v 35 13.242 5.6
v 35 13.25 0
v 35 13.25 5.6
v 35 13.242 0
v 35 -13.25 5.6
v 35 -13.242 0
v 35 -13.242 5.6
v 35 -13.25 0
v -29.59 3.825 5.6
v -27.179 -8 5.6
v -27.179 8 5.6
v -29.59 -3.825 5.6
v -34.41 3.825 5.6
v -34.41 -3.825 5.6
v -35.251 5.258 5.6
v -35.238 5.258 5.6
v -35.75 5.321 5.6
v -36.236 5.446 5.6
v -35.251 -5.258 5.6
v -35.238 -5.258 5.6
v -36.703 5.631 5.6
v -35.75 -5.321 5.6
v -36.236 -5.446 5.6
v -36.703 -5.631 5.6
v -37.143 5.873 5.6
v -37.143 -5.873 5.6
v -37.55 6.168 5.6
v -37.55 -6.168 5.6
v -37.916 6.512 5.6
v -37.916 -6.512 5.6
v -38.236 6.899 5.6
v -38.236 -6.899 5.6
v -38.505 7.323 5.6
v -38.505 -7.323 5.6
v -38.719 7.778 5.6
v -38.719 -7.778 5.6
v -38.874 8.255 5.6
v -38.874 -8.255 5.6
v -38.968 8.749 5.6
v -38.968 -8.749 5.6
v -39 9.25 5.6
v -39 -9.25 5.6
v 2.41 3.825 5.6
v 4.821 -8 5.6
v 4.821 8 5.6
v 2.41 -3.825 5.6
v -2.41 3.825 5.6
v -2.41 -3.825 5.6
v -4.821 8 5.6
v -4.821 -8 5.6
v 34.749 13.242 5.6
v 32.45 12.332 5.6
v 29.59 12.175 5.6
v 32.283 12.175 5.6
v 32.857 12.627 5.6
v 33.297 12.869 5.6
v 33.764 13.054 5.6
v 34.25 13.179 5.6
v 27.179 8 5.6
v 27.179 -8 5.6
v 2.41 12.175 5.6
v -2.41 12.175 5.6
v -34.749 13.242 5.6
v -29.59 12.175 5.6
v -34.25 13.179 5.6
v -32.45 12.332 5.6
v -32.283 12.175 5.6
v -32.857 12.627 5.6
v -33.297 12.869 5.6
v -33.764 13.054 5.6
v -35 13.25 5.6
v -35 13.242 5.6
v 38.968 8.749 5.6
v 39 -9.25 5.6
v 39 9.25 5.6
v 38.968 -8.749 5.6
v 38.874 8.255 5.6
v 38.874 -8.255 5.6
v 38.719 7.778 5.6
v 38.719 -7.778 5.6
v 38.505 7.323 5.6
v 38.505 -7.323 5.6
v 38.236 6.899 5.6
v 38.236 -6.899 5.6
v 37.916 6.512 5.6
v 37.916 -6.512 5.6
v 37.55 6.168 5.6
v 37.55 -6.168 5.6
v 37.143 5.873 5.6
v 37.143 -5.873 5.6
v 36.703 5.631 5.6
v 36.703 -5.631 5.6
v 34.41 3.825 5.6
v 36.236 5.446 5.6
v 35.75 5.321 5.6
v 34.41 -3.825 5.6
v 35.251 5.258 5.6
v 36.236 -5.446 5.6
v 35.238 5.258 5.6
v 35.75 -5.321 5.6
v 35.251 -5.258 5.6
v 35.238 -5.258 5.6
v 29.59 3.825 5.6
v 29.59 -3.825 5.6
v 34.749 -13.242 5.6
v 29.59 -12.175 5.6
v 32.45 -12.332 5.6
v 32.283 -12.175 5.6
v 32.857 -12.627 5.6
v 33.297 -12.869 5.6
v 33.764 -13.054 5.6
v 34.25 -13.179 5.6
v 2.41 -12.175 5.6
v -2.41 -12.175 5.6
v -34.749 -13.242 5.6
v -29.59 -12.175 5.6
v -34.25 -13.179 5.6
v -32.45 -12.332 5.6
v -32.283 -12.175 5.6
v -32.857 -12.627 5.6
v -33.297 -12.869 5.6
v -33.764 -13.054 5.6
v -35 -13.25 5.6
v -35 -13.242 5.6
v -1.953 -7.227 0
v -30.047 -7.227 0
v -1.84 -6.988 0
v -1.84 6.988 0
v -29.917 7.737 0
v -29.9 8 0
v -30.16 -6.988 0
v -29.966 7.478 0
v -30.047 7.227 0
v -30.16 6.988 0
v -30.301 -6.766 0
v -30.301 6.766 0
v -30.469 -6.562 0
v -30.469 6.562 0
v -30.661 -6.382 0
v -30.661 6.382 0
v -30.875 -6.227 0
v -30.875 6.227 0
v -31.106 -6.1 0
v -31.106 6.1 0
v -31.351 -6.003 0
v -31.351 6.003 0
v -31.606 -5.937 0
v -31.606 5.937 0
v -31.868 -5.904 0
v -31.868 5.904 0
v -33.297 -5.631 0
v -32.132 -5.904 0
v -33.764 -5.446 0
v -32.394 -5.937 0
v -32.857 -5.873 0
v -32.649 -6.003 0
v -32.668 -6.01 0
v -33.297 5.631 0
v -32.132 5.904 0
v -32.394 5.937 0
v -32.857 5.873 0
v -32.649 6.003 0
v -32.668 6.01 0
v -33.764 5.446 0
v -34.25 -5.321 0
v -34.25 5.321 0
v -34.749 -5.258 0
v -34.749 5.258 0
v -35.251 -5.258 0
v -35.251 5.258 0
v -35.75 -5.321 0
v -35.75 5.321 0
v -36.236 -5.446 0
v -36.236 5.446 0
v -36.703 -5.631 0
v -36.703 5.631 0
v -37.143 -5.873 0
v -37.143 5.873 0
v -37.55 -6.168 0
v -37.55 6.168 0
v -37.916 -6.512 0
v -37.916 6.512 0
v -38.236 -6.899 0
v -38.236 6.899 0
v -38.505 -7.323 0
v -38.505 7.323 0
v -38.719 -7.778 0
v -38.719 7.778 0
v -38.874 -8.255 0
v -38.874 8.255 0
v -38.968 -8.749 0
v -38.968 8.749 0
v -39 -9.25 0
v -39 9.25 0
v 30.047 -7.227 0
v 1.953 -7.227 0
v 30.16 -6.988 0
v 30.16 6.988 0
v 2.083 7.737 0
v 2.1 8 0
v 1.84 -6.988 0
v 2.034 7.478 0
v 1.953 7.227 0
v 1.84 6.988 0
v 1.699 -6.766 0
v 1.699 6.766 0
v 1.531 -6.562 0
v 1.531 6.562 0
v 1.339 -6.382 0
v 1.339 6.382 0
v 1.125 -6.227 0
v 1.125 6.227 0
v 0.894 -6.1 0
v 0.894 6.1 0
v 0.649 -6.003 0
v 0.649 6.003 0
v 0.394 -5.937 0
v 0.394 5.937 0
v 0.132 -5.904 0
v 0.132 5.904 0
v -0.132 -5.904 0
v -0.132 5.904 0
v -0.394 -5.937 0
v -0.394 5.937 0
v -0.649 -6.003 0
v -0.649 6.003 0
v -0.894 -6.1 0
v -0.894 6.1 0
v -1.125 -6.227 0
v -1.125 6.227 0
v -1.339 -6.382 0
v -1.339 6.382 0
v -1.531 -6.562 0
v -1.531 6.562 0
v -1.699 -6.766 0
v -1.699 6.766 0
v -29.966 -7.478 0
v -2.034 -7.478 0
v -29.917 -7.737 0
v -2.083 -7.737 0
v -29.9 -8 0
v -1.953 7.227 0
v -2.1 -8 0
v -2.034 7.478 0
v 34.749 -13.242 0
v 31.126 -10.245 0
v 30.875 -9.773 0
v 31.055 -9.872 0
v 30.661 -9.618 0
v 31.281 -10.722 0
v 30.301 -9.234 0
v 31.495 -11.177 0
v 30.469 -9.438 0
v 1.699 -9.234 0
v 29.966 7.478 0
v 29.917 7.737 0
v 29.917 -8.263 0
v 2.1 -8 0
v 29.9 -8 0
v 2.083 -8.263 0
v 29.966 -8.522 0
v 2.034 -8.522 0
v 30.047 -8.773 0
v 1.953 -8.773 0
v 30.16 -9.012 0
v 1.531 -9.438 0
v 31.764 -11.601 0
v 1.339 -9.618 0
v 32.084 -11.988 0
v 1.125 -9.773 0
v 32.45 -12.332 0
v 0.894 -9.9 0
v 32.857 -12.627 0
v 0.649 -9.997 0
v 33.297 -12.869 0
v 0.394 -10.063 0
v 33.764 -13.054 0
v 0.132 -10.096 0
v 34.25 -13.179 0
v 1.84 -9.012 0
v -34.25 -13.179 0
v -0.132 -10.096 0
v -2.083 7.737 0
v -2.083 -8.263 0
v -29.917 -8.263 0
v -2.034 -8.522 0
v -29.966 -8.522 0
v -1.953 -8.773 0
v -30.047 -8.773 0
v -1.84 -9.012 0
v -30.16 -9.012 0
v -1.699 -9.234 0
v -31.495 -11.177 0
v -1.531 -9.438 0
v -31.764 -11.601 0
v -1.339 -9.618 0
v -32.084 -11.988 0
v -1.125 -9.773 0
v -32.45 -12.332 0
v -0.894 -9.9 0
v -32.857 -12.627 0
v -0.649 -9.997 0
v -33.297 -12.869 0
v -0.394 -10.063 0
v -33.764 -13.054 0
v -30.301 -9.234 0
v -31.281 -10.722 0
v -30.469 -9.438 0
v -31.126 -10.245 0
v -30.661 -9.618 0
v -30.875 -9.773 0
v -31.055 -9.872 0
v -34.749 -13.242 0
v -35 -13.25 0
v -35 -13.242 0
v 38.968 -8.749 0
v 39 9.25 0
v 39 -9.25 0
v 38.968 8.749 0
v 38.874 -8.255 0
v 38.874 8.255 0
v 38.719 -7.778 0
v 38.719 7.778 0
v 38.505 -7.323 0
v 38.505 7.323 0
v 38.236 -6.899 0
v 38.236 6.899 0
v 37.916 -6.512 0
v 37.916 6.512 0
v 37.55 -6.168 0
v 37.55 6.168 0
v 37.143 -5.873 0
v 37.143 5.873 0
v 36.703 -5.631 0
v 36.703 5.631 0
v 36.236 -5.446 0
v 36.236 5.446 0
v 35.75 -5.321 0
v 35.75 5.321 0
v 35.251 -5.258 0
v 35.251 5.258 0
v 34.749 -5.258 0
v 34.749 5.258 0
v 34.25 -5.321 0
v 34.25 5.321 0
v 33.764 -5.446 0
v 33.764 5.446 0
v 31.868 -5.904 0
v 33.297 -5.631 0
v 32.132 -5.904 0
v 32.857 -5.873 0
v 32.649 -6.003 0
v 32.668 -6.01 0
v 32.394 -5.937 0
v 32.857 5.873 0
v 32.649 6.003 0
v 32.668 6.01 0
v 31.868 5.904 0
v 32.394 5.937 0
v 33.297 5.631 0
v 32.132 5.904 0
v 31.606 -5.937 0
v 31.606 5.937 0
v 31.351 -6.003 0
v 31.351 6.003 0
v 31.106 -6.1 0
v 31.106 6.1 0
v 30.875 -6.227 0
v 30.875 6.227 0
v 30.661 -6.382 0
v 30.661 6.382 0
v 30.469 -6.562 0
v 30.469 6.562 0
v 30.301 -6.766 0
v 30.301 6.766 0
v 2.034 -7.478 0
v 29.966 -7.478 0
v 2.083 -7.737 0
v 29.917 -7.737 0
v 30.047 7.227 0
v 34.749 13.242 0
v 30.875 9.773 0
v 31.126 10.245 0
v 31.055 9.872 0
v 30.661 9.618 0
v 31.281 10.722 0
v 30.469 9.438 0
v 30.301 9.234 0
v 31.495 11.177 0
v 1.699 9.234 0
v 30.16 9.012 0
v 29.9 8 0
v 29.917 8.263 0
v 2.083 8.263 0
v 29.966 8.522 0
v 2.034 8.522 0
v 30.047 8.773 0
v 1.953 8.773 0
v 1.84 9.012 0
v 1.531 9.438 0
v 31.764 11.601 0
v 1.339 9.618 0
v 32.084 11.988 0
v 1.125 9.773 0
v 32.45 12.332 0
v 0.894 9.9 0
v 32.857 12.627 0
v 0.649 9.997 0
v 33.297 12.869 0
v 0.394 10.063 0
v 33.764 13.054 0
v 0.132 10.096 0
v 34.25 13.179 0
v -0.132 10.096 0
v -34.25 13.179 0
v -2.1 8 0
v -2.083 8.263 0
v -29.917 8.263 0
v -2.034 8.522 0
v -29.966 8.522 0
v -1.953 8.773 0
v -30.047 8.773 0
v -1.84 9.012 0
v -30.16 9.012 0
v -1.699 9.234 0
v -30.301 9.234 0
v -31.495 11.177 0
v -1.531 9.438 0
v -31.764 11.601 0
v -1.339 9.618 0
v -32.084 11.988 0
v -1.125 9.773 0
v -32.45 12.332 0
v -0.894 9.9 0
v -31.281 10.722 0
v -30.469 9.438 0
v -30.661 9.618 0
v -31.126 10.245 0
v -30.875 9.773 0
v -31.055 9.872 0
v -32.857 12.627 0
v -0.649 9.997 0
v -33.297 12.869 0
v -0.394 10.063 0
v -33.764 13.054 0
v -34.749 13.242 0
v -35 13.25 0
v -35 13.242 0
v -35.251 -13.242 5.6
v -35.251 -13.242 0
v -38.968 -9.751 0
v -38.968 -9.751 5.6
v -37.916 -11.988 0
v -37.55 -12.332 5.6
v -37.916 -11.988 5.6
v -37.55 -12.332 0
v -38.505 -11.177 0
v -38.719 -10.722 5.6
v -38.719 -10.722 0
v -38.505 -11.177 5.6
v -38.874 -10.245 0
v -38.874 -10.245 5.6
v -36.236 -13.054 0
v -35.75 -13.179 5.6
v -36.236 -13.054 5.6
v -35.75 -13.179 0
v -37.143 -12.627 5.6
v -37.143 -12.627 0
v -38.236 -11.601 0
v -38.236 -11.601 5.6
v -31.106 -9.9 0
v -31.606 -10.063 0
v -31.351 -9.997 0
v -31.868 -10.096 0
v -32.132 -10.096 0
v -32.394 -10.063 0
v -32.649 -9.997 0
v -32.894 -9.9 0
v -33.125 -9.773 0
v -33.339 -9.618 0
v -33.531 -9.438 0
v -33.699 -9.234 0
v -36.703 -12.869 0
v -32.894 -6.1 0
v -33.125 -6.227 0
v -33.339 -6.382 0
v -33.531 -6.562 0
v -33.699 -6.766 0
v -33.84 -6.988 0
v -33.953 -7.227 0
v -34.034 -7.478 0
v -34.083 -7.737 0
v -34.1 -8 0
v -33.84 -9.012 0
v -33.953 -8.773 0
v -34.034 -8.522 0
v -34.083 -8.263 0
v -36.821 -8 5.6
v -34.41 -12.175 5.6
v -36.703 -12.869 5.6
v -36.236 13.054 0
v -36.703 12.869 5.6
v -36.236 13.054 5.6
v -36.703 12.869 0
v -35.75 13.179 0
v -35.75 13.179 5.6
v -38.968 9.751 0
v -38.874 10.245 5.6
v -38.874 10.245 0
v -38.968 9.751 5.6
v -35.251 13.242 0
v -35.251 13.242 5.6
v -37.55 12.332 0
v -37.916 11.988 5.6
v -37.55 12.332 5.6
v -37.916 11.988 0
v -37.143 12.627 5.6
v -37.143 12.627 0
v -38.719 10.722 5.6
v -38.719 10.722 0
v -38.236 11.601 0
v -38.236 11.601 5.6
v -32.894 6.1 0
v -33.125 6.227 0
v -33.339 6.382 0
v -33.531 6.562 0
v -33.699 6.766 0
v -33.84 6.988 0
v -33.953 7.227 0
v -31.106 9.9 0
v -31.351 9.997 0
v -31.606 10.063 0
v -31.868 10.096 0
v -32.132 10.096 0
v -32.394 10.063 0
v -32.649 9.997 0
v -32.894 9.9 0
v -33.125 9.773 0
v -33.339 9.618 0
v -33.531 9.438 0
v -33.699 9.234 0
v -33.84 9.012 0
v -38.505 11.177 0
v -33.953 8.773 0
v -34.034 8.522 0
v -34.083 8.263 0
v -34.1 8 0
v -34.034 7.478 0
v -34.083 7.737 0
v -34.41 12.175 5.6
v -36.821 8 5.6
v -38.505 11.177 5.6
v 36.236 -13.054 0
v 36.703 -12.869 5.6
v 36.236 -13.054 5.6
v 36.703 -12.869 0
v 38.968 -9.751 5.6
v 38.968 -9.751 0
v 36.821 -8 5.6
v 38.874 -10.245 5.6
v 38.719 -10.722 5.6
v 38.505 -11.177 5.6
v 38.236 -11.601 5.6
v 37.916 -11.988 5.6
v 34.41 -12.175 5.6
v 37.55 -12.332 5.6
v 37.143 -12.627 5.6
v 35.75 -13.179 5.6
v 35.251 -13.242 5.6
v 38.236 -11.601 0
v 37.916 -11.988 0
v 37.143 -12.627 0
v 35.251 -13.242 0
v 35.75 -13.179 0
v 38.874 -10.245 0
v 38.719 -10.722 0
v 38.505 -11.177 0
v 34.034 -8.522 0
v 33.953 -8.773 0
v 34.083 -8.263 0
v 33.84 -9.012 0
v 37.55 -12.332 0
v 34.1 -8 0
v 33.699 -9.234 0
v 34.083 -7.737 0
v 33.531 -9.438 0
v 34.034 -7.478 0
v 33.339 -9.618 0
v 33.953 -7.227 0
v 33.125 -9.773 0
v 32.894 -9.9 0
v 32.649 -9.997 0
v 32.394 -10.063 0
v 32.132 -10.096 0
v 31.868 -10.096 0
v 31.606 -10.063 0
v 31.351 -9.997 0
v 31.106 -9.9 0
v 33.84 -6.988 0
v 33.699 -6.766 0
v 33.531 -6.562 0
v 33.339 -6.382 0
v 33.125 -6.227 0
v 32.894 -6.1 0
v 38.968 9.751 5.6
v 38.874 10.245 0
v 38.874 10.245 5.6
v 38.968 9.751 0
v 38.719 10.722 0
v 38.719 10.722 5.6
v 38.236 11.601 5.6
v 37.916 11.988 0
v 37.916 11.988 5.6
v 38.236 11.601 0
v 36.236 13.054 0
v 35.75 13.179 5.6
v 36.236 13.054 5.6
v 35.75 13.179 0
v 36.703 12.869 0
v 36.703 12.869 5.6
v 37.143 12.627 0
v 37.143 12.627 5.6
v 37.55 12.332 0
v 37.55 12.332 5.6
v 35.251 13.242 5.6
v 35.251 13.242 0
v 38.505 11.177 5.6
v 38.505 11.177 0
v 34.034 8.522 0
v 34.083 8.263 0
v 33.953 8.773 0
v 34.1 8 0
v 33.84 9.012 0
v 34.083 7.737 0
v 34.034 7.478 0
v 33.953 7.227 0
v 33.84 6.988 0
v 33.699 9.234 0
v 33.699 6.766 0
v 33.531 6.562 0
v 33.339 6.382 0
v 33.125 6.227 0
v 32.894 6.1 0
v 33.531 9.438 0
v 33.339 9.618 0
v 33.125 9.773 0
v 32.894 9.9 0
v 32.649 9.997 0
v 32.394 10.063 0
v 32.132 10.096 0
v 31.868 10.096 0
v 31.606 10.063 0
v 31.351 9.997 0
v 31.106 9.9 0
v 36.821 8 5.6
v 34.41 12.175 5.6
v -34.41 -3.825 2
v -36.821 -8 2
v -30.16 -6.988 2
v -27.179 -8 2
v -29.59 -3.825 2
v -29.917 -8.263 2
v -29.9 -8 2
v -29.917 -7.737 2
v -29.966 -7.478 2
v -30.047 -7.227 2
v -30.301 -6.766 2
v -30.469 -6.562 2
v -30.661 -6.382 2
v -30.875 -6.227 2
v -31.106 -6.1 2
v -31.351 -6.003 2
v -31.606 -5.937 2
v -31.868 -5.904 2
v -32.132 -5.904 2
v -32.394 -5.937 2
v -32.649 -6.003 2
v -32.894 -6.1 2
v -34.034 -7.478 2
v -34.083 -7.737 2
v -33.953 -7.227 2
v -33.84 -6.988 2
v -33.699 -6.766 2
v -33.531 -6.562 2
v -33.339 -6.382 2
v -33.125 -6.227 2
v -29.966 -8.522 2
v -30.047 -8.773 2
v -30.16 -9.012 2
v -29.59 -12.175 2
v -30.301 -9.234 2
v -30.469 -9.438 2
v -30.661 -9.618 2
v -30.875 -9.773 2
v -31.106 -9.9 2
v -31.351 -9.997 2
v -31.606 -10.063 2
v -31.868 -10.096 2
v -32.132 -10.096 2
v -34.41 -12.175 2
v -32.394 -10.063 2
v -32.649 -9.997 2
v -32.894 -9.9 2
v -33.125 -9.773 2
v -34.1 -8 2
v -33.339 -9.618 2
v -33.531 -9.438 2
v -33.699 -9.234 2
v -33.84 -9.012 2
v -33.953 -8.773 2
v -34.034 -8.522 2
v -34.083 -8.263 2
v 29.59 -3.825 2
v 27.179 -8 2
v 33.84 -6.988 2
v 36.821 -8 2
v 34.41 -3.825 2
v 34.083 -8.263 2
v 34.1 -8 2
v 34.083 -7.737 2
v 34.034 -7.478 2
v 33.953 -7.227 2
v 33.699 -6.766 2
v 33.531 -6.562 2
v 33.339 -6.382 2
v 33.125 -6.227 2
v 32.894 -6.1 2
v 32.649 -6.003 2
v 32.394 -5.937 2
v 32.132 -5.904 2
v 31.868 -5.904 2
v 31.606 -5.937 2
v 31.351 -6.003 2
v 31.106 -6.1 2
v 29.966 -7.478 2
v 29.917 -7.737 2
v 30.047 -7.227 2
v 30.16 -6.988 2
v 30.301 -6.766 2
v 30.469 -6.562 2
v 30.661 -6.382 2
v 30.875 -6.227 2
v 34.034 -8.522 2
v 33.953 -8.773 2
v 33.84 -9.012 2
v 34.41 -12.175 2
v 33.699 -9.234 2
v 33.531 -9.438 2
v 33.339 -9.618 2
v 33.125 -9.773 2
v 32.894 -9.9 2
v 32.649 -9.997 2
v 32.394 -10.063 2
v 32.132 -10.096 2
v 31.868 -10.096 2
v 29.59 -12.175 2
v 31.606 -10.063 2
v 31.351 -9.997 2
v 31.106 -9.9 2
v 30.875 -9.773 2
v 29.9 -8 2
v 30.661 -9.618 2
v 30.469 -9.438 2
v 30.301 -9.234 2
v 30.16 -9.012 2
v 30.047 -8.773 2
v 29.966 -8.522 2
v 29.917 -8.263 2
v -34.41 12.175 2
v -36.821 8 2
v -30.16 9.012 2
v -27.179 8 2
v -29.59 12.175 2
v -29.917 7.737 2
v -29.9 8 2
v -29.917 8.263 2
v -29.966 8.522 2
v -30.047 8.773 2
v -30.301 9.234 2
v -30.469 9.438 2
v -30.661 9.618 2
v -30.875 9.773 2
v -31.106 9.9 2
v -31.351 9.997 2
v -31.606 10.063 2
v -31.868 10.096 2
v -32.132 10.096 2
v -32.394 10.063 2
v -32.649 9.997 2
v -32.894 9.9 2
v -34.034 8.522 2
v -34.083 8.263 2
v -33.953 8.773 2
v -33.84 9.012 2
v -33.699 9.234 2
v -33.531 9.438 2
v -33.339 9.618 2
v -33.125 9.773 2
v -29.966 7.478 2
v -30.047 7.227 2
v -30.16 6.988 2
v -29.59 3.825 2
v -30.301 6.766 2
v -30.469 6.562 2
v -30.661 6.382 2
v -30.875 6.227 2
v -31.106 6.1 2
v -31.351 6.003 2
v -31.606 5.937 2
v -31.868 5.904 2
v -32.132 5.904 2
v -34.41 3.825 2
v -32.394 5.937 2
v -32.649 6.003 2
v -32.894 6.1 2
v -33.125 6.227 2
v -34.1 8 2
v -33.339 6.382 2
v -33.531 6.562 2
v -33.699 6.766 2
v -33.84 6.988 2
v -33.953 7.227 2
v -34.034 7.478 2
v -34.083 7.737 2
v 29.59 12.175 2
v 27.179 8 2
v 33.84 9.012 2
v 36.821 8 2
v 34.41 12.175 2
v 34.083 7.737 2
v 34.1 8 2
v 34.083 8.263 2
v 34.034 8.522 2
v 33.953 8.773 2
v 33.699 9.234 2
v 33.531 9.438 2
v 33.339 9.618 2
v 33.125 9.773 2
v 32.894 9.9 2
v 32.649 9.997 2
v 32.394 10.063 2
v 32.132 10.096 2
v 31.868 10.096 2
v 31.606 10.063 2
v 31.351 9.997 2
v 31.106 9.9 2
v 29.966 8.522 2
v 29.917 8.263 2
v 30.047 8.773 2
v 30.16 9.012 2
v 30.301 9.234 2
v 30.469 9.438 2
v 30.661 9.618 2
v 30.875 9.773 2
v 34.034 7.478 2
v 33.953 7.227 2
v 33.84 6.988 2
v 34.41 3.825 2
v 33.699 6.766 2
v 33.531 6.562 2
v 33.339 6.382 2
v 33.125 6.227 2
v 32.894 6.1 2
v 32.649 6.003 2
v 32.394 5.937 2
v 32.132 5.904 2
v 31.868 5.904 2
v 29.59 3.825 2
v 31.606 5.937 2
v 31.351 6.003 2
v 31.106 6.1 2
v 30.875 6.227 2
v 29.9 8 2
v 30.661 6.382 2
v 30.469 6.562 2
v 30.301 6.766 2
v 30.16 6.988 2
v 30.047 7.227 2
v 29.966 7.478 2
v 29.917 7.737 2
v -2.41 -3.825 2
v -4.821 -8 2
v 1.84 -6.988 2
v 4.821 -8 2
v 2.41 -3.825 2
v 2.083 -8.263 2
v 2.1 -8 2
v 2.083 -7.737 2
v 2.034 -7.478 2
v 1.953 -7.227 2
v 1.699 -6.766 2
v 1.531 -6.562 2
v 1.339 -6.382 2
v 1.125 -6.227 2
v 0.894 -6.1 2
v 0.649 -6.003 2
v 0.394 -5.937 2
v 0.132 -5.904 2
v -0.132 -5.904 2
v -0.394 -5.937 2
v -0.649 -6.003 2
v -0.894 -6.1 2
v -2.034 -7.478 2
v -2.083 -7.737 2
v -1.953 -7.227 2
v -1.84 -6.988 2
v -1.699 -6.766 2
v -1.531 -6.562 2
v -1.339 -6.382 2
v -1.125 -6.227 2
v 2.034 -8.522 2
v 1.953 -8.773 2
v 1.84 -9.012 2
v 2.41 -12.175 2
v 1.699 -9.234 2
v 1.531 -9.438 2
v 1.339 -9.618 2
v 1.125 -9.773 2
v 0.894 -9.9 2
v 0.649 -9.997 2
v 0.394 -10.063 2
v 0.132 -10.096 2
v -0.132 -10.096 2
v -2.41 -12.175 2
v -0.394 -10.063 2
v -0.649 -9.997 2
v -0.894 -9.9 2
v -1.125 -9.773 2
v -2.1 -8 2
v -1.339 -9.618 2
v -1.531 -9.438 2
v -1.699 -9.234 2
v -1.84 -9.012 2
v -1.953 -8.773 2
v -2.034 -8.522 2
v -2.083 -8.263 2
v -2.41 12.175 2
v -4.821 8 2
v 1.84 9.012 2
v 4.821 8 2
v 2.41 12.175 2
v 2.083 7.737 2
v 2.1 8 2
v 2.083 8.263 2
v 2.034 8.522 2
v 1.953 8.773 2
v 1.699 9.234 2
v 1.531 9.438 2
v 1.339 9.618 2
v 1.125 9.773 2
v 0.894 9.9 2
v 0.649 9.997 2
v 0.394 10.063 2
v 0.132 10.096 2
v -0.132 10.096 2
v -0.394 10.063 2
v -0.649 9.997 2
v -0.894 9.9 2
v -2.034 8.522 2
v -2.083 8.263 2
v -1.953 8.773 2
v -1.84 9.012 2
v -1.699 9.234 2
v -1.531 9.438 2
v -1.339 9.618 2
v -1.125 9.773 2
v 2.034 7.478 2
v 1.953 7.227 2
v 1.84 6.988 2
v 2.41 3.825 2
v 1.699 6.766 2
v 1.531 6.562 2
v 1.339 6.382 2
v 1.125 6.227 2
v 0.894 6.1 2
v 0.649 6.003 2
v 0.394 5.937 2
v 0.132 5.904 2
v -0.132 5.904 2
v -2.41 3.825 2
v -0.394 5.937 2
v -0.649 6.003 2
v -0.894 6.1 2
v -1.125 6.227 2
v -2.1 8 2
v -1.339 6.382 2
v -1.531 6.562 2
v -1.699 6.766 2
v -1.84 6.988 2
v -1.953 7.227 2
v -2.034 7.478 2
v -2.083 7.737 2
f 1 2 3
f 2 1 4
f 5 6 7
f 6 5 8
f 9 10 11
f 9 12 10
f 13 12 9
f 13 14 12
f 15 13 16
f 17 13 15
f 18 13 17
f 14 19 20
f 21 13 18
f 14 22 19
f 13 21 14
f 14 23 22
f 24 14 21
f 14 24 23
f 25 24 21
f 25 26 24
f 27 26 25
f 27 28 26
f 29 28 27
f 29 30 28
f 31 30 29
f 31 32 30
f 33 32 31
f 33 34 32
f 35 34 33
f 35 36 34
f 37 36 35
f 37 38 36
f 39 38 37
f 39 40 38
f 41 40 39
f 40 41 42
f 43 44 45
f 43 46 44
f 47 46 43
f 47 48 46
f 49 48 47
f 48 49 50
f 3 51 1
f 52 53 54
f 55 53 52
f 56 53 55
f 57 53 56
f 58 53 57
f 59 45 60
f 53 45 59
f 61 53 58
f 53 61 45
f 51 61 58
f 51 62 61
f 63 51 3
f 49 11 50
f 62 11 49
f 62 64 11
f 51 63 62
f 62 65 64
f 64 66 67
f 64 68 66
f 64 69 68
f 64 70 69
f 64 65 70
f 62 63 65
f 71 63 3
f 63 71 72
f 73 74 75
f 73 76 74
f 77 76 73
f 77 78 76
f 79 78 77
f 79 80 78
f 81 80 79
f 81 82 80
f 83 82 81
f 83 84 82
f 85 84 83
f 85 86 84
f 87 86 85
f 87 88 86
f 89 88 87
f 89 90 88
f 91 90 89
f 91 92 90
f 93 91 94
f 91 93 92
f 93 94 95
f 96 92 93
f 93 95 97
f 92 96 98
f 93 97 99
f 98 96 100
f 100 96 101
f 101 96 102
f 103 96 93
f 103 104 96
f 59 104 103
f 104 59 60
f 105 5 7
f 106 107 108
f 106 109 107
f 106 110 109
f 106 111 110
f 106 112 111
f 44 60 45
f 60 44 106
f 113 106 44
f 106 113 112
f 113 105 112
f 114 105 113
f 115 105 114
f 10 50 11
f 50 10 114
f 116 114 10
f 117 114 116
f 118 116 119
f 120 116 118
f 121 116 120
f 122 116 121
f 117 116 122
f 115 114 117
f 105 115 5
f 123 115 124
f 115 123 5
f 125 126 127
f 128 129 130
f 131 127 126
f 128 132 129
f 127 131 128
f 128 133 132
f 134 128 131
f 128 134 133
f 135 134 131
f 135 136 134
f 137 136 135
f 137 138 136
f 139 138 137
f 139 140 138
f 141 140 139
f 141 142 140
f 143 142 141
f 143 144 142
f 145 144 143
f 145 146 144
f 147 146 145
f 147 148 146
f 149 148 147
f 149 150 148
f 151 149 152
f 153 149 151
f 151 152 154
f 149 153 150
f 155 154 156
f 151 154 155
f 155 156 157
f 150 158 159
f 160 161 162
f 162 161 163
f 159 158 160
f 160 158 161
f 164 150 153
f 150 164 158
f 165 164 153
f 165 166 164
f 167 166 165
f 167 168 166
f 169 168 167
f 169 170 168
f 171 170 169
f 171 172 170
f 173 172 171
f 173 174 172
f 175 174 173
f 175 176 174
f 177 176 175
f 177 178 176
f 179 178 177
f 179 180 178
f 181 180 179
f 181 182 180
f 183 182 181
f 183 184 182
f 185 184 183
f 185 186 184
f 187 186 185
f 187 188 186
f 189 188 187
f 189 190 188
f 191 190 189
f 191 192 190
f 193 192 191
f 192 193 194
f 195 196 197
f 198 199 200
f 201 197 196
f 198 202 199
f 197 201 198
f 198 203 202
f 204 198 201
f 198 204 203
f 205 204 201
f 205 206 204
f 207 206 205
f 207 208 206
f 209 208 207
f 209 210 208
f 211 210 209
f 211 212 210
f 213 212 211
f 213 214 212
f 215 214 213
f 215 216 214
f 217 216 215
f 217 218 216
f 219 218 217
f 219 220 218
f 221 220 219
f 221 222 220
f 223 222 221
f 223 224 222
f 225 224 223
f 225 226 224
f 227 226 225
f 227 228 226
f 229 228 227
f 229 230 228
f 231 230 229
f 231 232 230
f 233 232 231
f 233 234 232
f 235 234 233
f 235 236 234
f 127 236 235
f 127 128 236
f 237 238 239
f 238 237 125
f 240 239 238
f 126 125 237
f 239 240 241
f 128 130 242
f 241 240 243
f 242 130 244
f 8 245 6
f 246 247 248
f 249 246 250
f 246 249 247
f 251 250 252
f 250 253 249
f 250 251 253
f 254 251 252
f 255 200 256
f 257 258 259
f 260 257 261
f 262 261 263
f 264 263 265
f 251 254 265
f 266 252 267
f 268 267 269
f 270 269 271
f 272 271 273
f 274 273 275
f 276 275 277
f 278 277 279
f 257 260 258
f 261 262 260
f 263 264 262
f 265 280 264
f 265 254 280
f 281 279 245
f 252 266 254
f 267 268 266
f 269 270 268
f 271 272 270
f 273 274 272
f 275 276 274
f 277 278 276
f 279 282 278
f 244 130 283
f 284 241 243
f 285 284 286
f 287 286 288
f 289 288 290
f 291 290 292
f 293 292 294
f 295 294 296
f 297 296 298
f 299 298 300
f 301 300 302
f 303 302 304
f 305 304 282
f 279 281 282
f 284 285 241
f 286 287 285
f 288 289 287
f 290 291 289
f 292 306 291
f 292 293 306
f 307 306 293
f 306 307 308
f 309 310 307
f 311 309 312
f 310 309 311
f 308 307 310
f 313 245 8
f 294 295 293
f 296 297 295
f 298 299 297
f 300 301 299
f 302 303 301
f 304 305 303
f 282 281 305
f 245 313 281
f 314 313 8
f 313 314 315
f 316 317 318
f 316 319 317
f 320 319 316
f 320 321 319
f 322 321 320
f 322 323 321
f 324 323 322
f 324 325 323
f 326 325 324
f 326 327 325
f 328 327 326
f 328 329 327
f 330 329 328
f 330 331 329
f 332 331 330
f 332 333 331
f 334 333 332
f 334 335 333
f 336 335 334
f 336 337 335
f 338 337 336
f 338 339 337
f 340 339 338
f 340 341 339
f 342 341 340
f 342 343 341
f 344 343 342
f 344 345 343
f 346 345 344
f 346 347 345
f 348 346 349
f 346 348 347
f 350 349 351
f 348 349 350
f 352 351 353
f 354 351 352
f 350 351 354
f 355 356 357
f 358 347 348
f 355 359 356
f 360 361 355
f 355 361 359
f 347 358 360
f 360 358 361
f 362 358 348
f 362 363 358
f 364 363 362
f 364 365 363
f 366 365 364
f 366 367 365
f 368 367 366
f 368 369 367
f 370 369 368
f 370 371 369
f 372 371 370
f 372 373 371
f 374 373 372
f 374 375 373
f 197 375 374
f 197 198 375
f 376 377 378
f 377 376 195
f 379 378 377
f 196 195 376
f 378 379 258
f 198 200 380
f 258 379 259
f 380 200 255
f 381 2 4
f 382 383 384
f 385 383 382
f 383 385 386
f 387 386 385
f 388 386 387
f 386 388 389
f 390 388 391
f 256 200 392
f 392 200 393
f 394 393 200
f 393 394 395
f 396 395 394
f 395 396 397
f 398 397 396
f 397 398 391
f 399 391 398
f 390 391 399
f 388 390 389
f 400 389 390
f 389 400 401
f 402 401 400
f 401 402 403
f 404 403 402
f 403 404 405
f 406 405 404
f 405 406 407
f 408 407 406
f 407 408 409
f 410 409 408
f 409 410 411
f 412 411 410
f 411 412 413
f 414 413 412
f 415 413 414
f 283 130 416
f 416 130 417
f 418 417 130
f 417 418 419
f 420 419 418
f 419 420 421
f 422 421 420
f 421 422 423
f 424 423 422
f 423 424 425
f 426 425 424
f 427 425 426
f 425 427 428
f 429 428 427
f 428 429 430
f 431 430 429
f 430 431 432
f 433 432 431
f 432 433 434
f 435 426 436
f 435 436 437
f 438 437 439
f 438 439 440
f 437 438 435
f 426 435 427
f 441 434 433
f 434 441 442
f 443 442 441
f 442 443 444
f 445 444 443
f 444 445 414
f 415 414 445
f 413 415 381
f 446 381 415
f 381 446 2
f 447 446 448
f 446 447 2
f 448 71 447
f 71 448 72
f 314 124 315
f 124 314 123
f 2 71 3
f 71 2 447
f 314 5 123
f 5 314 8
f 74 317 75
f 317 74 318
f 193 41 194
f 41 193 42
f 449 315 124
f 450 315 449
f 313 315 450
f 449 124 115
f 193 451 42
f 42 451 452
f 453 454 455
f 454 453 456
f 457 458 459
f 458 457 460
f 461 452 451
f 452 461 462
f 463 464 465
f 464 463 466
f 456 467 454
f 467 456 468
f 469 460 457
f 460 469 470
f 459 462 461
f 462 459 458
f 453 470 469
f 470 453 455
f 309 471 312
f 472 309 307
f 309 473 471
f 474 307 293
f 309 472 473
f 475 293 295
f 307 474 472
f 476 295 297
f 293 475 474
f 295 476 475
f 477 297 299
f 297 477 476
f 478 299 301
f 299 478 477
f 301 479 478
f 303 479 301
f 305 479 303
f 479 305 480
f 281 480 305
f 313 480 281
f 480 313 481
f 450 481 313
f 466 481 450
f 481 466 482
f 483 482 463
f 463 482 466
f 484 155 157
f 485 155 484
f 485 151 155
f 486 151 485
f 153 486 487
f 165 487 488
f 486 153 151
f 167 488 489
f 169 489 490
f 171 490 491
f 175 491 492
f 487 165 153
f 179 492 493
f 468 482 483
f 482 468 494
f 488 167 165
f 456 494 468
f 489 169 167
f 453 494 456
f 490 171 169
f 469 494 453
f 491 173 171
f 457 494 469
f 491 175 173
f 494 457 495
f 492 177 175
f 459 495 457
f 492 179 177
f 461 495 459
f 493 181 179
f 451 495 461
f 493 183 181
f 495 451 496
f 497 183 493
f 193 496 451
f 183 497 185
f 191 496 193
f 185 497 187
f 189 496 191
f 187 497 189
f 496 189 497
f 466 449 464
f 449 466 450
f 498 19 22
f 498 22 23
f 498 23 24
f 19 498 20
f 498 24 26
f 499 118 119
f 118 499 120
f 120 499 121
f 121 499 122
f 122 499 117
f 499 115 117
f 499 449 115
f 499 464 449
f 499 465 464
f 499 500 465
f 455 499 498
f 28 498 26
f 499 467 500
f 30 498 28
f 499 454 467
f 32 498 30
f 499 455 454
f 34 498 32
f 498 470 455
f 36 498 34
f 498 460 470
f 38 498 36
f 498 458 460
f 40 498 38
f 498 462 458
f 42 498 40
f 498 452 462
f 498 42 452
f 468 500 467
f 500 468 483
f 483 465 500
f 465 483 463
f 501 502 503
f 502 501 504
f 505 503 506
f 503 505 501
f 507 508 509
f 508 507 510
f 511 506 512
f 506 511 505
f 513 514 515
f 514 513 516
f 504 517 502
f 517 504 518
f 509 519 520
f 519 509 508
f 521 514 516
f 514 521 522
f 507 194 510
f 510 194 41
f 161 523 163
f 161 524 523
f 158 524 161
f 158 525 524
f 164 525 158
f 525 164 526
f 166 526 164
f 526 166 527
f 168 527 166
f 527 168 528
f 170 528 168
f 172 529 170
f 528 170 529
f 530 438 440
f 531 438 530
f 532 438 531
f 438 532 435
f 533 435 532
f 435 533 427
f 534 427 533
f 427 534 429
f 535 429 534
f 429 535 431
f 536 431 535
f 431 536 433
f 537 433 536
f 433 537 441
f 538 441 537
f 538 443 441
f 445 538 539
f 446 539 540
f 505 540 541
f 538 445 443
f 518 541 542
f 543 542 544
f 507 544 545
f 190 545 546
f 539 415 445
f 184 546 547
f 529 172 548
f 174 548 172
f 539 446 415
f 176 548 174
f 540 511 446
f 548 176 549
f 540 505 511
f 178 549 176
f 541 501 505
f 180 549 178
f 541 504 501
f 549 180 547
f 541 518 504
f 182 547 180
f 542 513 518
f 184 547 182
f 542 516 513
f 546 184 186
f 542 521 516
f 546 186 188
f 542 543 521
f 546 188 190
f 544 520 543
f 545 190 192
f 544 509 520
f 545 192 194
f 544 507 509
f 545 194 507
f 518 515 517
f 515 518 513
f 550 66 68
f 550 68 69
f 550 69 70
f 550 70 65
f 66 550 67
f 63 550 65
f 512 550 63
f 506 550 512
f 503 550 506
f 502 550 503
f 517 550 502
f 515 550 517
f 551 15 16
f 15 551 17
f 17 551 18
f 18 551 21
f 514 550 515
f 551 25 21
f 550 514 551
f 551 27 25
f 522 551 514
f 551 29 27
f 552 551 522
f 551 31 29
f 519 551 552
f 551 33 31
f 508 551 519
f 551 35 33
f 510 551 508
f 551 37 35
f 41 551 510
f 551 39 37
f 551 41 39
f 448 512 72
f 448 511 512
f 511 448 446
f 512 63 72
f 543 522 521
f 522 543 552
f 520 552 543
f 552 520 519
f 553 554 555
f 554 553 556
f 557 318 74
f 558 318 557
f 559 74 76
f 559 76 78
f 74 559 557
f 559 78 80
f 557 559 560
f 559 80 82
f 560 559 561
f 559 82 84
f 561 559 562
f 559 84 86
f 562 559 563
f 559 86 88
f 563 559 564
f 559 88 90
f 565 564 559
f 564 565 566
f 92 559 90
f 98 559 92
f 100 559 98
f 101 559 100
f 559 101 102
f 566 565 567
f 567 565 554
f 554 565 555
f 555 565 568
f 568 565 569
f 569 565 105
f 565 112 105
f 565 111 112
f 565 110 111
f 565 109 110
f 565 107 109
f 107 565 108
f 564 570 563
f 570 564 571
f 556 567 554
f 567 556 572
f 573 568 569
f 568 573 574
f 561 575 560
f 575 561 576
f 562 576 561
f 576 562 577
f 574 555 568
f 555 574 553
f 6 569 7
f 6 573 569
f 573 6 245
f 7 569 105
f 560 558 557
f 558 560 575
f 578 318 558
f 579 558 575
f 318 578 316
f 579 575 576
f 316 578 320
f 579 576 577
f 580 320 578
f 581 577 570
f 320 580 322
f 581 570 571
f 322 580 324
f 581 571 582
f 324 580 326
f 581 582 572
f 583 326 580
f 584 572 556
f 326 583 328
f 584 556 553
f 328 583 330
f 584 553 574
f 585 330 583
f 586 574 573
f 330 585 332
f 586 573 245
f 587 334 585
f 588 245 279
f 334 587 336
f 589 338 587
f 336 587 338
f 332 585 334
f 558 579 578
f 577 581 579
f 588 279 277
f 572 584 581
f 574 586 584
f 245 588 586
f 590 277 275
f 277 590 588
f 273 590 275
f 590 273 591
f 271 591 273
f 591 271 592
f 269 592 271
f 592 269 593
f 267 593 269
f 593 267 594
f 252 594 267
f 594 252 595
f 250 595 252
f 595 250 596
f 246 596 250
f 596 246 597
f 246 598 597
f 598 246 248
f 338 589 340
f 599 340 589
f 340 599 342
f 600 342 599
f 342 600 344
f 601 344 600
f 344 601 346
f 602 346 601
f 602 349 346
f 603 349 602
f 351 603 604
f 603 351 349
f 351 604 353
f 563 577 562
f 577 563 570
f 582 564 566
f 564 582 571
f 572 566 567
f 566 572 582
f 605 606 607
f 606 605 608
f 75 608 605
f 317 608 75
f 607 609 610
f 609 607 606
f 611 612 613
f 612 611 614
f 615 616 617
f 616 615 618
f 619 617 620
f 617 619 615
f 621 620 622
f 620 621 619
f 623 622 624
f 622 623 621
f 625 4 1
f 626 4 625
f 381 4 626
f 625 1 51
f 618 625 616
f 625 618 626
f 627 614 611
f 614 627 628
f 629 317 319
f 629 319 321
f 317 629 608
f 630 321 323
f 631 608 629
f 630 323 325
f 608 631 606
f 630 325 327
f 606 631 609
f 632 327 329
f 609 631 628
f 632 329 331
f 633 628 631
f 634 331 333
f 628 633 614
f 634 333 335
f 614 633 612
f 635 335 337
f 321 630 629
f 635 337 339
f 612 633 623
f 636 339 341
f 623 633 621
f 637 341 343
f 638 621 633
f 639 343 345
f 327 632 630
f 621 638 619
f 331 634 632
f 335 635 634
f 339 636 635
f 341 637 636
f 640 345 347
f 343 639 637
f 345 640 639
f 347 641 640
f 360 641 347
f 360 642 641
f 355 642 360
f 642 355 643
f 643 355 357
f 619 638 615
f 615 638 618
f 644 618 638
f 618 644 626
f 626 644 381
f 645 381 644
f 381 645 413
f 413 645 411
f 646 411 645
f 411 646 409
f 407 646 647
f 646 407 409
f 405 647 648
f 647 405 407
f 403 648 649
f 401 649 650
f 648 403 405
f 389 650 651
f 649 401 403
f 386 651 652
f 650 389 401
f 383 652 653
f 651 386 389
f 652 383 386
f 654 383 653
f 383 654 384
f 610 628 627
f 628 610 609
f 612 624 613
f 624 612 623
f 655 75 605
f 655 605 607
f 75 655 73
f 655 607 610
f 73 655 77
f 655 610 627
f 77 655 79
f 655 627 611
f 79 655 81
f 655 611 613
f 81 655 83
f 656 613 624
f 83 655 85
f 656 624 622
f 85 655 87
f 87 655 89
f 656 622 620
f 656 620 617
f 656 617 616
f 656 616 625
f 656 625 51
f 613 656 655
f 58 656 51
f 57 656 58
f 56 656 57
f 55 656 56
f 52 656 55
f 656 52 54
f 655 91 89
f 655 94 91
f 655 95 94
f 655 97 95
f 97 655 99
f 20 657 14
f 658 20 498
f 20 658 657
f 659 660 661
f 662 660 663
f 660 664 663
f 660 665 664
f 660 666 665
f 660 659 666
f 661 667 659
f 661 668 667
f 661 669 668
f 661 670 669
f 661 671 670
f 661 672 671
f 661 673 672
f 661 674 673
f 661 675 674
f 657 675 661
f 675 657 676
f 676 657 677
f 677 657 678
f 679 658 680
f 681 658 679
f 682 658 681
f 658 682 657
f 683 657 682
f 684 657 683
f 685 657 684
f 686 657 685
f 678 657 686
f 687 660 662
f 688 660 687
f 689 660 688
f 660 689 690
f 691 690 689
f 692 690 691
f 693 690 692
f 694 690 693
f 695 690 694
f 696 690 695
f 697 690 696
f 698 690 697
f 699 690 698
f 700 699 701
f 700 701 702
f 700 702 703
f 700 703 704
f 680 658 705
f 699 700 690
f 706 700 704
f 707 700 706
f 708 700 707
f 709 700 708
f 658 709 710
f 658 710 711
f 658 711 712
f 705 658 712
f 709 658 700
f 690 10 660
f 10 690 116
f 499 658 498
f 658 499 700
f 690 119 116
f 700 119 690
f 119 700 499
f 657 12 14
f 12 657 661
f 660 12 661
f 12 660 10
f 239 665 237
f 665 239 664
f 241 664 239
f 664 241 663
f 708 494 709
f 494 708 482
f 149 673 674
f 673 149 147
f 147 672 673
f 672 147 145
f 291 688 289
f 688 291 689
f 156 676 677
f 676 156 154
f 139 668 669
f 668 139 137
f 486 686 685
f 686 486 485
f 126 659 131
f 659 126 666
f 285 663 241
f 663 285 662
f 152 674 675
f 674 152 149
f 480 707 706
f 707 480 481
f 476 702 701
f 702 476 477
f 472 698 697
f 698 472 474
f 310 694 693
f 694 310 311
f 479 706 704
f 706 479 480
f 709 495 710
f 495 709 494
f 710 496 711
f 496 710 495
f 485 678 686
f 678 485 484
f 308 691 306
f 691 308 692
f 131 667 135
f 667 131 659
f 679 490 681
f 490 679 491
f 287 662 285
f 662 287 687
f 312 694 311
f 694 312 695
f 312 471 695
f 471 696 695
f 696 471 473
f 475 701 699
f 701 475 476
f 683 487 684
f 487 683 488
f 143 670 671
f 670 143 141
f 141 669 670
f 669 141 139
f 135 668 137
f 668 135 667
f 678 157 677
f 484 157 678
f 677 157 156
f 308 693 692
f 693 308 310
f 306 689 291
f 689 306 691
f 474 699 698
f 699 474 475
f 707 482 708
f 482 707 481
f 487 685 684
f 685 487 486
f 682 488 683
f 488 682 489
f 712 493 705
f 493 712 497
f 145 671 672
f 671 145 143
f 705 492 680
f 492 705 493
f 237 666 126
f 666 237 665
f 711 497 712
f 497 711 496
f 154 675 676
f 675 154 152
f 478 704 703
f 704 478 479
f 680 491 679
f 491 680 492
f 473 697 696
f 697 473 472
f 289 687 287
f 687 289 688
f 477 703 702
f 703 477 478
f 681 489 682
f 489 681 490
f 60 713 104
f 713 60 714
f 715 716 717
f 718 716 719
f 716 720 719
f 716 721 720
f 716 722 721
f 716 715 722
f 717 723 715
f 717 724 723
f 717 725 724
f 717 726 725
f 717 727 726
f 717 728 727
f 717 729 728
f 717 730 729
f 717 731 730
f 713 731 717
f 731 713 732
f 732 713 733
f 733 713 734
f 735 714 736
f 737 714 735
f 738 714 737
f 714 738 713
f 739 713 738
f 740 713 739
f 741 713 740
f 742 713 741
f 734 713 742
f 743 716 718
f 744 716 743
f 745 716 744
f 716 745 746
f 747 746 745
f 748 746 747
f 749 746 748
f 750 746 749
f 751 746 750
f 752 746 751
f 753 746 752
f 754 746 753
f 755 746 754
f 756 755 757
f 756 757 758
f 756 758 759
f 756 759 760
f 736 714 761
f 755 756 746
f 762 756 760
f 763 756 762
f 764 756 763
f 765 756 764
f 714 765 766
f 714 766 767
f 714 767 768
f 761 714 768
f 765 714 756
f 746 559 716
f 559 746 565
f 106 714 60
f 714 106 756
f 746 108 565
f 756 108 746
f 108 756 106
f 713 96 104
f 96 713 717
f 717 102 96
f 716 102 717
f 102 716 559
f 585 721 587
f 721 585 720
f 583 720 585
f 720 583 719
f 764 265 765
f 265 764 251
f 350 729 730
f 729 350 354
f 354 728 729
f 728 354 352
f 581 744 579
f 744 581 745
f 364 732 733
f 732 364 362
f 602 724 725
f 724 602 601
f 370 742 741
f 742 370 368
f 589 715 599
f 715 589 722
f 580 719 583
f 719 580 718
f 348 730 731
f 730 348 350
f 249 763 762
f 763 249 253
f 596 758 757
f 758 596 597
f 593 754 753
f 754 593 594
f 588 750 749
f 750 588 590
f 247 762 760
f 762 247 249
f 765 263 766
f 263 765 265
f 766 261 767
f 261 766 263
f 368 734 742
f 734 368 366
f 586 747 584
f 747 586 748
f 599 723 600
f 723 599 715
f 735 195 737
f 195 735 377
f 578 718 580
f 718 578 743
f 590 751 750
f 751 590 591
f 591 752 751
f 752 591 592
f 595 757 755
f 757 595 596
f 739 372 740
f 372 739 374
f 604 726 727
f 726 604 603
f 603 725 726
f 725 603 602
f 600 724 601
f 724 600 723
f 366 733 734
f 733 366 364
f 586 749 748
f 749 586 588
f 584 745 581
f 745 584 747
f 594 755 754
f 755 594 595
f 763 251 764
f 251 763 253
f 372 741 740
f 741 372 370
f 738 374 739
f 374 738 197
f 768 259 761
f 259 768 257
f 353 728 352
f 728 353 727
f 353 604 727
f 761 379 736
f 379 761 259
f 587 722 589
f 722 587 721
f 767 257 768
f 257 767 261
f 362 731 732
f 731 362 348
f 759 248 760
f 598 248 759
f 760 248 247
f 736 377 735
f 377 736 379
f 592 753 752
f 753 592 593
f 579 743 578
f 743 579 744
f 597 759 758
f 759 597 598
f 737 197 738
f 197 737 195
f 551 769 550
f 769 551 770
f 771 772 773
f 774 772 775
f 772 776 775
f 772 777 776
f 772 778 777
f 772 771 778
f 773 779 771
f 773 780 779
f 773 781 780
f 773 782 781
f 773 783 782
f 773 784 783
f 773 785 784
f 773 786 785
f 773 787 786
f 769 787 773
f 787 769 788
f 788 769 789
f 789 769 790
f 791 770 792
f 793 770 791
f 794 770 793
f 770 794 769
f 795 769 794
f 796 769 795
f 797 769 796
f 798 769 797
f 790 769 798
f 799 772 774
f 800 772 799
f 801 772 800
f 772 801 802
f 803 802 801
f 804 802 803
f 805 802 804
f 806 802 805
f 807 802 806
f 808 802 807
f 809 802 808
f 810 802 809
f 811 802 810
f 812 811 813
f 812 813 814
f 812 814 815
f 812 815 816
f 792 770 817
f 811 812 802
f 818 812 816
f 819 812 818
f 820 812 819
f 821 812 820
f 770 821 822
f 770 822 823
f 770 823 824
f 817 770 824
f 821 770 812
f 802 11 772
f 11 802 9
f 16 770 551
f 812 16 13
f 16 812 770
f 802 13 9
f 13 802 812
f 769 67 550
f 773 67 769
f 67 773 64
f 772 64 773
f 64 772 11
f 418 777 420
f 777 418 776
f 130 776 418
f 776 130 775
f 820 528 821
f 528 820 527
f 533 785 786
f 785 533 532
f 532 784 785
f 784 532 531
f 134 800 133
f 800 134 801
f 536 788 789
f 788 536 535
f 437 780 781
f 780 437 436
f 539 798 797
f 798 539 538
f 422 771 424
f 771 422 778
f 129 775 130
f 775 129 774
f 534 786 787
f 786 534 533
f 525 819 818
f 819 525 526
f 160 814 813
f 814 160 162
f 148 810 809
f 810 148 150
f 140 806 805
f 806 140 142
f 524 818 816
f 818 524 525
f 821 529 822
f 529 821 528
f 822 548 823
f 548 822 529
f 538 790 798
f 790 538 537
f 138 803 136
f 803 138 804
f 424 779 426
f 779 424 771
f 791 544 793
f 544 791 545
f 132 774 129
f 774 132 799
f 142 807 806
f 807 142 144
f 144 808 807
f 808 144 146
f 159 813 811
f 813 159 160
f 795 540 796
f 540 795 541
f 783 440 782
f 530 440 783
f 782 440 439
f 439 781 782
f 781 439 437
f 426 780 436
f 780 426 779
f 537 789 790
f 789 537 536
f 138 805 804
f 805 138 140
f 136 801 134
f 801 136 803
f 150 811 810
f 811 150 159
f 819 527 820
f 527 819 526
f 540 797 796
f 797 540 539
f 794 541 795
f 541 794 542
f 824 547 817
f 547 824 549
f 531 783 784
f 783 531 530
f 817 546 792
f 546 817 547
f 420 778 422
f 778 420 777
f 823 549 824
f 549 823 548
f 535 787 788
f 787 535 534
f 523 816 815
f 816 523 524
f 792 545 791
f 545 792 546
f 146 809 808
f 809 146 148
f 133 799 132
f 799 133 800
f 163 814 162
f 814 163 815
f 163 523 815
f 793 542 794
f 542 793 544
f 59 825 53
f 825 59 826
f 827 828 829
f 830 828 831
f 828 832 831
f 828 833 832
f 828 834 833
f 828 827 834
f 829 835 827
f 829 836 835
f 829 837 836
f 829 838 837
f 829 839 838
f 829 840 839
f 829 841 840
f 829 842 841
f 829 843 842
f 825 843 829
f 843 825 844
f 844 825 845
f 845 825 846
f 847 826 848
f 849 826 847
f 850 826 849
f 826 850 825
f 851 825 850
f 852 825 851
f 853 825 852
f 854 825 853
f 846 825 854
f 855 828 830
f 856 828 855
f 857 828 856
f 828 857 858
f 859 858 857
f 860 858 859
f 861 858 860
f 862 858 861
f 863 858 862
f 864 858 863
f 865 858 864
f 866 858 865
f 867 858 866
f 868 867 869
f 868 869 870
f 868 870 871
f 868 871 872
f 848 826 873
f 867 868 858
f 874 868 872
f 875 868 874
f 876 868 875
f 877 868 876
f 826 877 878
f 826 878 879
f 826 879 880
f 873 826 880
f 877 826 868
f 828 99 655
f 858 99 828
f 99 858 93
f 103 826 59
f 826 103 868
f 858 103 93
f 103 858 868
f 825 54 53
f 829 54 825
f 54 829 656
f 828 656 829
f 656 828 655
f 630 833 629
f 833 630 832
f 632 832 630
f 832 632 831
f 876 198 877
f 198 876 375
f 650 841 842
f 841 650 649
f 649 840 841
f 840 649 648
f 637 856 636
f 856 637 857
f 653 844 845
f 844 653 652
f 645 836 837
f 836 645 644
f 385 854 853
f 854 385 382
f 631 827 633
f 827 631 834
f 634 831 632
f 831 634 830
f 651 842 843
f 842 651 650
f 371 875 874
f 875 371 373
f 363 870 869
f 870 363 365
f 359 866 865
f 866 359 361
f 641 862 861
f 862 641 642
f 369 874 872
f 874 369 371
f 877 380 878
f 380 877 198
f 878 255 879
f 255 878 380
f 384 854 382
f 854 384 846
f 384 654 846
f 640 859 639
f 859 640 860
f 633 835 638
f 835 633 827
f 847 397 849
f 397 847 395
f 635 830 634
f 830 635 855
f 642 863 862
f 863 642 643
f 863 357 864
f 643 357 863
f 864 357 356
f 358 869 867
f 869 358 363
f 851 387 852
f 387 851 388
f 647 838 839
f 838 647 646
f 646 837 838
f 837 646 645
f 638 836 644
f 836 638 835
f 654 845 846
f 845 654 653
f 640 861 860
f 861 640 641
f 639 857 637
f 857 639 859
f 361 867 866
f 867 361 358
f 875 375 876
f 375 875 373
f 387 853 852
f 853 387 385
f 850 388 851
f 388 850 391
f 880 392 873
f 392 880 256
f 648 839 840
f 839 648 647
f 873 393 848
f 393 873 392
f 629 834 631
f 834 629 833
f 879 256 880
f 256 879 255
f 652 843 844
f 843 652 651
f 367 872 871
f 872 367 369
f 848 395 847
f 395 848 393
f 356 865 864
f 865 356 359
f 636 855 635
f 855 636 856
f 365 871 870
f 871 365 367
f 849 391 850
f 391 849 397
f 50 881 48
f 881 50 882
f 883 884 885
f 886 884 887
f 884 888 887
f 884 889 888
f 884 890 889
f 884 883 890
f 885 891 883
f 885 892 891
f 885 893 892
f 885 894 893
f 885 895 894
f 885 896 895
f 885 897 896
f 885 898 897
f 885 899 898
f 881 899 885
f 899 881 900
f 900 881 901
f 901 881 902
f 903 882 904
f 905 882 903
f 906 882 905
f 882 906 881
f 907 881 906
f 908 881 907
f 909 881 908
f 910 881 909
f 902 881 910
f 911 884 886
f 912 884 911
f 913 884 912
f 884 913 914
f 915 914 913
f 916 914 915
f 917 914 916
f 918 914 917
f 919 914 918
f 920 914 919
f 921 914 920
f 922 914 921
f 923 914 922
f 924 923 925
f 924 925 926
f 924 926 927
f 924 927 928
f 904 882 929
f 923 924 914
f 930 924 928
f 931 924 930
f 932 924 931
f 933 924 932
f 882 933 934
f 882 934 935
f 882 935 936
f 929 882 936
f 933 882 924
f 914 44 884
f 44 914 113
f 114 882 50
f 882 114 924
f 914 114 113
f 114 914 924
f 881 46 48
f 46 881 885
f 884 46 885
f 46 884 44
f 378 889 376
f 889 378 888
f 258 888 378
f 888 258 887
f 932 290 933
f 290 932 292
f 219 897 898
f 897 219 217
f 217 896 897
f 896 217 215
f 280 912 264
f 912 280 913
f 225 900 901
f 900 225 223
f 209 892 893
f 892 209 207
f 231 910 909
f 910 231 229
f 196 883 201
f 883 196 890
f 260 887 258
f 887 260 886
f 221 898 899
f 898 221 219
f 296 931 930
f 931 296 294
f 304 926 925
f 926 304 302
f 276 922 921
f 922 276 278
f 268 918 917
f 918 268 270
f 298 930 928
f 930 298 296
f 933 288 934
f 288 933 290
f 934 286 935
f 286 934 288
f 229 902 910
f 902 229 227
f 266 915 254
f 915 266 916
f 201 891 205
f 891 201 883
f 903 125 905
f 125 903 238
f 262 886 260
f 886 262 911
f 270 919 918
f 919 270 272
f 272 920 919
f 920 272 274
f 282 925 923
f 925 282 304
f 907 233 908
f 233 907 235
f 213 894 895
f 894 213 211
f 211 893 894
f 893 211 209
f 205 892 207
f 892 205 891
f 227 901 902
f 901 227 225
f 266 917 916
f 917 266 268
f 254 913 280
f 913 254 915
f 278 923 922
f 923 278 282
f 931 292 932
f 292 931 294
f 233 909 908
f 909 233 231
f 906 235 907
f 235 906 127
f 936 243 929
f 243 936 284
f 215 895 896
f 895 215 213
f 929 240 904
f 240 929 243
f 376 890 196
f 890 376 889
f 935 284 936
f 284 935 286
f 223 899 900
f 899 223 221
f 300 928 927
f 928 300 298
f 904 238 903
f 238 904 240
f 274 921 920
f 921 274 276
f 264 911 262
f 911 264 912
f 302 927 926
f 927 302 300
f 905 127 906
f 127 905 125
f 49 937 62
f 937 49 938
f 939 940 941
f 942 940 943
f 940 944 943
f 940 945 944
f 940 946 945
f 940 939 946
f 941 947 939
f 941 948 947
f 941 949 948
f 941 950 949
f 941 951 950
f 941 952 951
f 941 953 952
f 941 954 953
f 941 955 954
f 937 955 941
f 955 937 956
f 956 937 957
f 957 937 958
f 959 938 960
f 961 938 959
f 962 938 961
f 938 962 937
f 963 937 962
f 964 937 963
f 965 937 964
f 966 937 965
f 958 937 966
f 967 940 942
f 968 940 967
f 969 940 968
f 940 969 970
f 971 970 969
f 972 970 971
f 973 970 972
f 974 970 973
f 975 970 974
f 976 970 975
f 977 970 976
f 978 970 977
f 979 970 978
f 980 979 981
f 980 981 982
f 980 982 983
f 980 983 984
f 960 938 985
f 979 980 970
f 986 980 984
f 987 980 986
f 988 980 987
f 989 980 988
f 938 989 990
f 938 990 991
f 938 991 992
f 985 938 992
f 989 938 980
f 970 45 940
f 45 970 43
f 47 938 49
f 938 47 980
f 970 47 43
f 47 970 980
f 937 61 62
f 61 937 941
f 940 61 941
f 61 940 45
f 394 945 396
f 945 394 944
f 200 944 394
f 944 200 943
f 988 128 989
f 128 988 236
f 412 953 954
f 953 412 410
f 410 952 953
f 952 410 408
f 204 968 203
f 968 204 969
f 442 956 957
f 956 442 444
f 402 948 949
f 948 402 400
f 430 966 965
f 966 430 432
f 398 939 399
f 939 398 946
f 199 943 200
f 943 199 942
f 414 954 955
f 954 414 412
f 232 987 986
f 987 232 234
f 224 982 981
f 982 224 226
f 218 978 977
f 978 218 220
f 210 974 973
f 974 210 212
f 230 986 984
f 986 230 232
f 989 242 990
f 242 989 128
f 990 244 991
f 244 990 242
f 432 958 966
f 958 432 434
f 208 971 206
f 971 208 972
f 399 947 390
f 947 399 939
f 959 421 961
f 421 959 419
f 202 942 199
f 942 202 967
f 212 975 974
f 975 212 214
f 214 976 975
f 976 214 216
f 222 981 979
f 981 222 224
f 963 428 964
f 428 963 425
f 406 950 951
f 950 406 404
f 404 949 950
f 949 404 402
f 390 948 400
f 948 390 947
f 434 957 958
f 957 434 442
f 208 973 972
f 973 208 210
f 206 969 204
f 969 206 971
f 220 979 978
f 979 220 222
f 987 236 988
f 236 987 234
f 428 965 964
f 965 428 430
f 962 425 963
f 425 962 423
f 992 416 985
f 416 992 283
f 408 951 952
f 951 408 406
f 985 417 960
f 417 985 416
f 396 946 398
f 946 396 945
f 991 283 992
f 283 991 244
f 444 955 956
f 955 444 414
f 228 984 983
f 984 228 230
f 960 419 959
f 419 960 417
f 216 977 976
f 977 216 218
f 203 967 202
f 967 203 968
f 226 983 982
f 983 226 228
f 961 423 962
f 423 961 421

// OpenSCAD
$fn=50;

// slot - A rounded slot framed by two cylinders of diameter w a distance l apart.
//  It is assumed that this is mostly used for subtraction. 
//  The drop makes it extend below the xy plane for robust subtraction.
module slot(l, w, h, drop)
{
    translate([l/2,0,-drop])
        cylinder(r=w/2,h=h+drop);
    translate([-l/2,0,-drop])
        cylinder(r=w/2,h=h+drop);
    translate([0,0,(h-drop)/2])
        cube([l, w, h+drop], center=true);
}

module hole(r, h, drop)
{
    translate([0,0,-drop])
    cylinder(r=r,h=h+drop);
}

// hexagon - A 2D hexagon with flat to flat diameter w. Flats are parallel to x axis.
module hexagon(w)
{
    s = w/sqrt(3);
    polygon([[-s/2,w/2],[s/2,w/2],[s,0],[s/2,-w/2],[-s/2,-w/2],[-s,0]]);
}

// hexagonalPrism - An extrusion of the hexagon. Has an optional drop below the xy plane.
module hexagonalPrism(w, h, drop)
{
    translate([0,0,-drop])
    linear_extrude(height=h+drop)
    hexagon(w);
}

// roundRect - Actually a rounded rectangular prism. Makes a cube of dimension x,y,z, but
//   centered on the z axis and sitting on the xy plane. Vertical corners are rounded
//   with radius r. Allows an optional drop below the xy plane.
module roundRect(x, y, z, r, drop)
{
    union()
    {
        translate([0,0,(z-drop)/2])
        {
            cube([x-2*r,y,z+drop],center=true);
            cube([x,y-2*r,z+drop],center=true);
        }
        translate([-(x/2-r),-(y/2-r),-drop])
            cylinder(r=r,h=z+drop);
        translate([-(x/2-r),(y/2-r),-drop])
            cylinder(r=r,h=z+drop);
        translate([(x/2-r),-(y/2-r),-drop])
            cylinder(r=r,h=z+drop);
        translate([(x/2-r),(y/2-r),-drop])
            cylinder(r=r,h=z+drop);
    }
}

smallR = 4.2/2; // Nominal 3.7 mm.  4.2 works on TAZ. For #6-32 holes
screwHeadDiameter = 6.5;  // Nominal 6.0 mm.
screwHeadHeight = 4.0;
lockNutHexFlat = 7.94 + 0.41;  // Flat to flat diameter for 5/16" nut = 7.94 mm.
                        // On Prusa this came out as a 7.5 opening.
lockNutHeight = 4.6;                 

module nutHolder(h, b, d) // height, backing, drop
{
    if (b != 0)
    {
        translate([0,0,b])
            hexagonalPrism(lockNutHexFlat, h, 0);
        hole(smallR, height, d);
    }
    else
    {
        hexagonalPrism(lockNutHexFlat, h+d, d);
    }
}

// The model


length = 78.0;
width = 26.5;  // Nominal is 27.0
backing = 2.0;
height = lockNutHeight + backing - 1.0;
holeSeparationX = 64.0;
holeSeparationY = 16.0;

difference()
{
    roundRect(length, width, height, 4, 0);
    
    union()
    {
        translate([-holeSeparationX/2,-holeSeparationY/2,0])
            nutHolder(height, backing, 0.1);
        translate([holeSeparationX/2,-holeSeparationY/2,0])
            nutHolder(height, backing, 0.1);
        translate([-holeSeparationX/2,holeSeparationY/2,0])
            nutHolder(height, backing, 0.1);
        translate([holeSeparationX/2,holeSeparationY/2,0])
            nutHolder(height, backing, 0.1);
        translate([0,-holeSeparationY/2,0])
            nutHolder(height, backing, 0.1);
        translate([0,holeSeparationY/2,0])
            nutHolder(height, backing, 0.1);
        
        
    }
    
}
